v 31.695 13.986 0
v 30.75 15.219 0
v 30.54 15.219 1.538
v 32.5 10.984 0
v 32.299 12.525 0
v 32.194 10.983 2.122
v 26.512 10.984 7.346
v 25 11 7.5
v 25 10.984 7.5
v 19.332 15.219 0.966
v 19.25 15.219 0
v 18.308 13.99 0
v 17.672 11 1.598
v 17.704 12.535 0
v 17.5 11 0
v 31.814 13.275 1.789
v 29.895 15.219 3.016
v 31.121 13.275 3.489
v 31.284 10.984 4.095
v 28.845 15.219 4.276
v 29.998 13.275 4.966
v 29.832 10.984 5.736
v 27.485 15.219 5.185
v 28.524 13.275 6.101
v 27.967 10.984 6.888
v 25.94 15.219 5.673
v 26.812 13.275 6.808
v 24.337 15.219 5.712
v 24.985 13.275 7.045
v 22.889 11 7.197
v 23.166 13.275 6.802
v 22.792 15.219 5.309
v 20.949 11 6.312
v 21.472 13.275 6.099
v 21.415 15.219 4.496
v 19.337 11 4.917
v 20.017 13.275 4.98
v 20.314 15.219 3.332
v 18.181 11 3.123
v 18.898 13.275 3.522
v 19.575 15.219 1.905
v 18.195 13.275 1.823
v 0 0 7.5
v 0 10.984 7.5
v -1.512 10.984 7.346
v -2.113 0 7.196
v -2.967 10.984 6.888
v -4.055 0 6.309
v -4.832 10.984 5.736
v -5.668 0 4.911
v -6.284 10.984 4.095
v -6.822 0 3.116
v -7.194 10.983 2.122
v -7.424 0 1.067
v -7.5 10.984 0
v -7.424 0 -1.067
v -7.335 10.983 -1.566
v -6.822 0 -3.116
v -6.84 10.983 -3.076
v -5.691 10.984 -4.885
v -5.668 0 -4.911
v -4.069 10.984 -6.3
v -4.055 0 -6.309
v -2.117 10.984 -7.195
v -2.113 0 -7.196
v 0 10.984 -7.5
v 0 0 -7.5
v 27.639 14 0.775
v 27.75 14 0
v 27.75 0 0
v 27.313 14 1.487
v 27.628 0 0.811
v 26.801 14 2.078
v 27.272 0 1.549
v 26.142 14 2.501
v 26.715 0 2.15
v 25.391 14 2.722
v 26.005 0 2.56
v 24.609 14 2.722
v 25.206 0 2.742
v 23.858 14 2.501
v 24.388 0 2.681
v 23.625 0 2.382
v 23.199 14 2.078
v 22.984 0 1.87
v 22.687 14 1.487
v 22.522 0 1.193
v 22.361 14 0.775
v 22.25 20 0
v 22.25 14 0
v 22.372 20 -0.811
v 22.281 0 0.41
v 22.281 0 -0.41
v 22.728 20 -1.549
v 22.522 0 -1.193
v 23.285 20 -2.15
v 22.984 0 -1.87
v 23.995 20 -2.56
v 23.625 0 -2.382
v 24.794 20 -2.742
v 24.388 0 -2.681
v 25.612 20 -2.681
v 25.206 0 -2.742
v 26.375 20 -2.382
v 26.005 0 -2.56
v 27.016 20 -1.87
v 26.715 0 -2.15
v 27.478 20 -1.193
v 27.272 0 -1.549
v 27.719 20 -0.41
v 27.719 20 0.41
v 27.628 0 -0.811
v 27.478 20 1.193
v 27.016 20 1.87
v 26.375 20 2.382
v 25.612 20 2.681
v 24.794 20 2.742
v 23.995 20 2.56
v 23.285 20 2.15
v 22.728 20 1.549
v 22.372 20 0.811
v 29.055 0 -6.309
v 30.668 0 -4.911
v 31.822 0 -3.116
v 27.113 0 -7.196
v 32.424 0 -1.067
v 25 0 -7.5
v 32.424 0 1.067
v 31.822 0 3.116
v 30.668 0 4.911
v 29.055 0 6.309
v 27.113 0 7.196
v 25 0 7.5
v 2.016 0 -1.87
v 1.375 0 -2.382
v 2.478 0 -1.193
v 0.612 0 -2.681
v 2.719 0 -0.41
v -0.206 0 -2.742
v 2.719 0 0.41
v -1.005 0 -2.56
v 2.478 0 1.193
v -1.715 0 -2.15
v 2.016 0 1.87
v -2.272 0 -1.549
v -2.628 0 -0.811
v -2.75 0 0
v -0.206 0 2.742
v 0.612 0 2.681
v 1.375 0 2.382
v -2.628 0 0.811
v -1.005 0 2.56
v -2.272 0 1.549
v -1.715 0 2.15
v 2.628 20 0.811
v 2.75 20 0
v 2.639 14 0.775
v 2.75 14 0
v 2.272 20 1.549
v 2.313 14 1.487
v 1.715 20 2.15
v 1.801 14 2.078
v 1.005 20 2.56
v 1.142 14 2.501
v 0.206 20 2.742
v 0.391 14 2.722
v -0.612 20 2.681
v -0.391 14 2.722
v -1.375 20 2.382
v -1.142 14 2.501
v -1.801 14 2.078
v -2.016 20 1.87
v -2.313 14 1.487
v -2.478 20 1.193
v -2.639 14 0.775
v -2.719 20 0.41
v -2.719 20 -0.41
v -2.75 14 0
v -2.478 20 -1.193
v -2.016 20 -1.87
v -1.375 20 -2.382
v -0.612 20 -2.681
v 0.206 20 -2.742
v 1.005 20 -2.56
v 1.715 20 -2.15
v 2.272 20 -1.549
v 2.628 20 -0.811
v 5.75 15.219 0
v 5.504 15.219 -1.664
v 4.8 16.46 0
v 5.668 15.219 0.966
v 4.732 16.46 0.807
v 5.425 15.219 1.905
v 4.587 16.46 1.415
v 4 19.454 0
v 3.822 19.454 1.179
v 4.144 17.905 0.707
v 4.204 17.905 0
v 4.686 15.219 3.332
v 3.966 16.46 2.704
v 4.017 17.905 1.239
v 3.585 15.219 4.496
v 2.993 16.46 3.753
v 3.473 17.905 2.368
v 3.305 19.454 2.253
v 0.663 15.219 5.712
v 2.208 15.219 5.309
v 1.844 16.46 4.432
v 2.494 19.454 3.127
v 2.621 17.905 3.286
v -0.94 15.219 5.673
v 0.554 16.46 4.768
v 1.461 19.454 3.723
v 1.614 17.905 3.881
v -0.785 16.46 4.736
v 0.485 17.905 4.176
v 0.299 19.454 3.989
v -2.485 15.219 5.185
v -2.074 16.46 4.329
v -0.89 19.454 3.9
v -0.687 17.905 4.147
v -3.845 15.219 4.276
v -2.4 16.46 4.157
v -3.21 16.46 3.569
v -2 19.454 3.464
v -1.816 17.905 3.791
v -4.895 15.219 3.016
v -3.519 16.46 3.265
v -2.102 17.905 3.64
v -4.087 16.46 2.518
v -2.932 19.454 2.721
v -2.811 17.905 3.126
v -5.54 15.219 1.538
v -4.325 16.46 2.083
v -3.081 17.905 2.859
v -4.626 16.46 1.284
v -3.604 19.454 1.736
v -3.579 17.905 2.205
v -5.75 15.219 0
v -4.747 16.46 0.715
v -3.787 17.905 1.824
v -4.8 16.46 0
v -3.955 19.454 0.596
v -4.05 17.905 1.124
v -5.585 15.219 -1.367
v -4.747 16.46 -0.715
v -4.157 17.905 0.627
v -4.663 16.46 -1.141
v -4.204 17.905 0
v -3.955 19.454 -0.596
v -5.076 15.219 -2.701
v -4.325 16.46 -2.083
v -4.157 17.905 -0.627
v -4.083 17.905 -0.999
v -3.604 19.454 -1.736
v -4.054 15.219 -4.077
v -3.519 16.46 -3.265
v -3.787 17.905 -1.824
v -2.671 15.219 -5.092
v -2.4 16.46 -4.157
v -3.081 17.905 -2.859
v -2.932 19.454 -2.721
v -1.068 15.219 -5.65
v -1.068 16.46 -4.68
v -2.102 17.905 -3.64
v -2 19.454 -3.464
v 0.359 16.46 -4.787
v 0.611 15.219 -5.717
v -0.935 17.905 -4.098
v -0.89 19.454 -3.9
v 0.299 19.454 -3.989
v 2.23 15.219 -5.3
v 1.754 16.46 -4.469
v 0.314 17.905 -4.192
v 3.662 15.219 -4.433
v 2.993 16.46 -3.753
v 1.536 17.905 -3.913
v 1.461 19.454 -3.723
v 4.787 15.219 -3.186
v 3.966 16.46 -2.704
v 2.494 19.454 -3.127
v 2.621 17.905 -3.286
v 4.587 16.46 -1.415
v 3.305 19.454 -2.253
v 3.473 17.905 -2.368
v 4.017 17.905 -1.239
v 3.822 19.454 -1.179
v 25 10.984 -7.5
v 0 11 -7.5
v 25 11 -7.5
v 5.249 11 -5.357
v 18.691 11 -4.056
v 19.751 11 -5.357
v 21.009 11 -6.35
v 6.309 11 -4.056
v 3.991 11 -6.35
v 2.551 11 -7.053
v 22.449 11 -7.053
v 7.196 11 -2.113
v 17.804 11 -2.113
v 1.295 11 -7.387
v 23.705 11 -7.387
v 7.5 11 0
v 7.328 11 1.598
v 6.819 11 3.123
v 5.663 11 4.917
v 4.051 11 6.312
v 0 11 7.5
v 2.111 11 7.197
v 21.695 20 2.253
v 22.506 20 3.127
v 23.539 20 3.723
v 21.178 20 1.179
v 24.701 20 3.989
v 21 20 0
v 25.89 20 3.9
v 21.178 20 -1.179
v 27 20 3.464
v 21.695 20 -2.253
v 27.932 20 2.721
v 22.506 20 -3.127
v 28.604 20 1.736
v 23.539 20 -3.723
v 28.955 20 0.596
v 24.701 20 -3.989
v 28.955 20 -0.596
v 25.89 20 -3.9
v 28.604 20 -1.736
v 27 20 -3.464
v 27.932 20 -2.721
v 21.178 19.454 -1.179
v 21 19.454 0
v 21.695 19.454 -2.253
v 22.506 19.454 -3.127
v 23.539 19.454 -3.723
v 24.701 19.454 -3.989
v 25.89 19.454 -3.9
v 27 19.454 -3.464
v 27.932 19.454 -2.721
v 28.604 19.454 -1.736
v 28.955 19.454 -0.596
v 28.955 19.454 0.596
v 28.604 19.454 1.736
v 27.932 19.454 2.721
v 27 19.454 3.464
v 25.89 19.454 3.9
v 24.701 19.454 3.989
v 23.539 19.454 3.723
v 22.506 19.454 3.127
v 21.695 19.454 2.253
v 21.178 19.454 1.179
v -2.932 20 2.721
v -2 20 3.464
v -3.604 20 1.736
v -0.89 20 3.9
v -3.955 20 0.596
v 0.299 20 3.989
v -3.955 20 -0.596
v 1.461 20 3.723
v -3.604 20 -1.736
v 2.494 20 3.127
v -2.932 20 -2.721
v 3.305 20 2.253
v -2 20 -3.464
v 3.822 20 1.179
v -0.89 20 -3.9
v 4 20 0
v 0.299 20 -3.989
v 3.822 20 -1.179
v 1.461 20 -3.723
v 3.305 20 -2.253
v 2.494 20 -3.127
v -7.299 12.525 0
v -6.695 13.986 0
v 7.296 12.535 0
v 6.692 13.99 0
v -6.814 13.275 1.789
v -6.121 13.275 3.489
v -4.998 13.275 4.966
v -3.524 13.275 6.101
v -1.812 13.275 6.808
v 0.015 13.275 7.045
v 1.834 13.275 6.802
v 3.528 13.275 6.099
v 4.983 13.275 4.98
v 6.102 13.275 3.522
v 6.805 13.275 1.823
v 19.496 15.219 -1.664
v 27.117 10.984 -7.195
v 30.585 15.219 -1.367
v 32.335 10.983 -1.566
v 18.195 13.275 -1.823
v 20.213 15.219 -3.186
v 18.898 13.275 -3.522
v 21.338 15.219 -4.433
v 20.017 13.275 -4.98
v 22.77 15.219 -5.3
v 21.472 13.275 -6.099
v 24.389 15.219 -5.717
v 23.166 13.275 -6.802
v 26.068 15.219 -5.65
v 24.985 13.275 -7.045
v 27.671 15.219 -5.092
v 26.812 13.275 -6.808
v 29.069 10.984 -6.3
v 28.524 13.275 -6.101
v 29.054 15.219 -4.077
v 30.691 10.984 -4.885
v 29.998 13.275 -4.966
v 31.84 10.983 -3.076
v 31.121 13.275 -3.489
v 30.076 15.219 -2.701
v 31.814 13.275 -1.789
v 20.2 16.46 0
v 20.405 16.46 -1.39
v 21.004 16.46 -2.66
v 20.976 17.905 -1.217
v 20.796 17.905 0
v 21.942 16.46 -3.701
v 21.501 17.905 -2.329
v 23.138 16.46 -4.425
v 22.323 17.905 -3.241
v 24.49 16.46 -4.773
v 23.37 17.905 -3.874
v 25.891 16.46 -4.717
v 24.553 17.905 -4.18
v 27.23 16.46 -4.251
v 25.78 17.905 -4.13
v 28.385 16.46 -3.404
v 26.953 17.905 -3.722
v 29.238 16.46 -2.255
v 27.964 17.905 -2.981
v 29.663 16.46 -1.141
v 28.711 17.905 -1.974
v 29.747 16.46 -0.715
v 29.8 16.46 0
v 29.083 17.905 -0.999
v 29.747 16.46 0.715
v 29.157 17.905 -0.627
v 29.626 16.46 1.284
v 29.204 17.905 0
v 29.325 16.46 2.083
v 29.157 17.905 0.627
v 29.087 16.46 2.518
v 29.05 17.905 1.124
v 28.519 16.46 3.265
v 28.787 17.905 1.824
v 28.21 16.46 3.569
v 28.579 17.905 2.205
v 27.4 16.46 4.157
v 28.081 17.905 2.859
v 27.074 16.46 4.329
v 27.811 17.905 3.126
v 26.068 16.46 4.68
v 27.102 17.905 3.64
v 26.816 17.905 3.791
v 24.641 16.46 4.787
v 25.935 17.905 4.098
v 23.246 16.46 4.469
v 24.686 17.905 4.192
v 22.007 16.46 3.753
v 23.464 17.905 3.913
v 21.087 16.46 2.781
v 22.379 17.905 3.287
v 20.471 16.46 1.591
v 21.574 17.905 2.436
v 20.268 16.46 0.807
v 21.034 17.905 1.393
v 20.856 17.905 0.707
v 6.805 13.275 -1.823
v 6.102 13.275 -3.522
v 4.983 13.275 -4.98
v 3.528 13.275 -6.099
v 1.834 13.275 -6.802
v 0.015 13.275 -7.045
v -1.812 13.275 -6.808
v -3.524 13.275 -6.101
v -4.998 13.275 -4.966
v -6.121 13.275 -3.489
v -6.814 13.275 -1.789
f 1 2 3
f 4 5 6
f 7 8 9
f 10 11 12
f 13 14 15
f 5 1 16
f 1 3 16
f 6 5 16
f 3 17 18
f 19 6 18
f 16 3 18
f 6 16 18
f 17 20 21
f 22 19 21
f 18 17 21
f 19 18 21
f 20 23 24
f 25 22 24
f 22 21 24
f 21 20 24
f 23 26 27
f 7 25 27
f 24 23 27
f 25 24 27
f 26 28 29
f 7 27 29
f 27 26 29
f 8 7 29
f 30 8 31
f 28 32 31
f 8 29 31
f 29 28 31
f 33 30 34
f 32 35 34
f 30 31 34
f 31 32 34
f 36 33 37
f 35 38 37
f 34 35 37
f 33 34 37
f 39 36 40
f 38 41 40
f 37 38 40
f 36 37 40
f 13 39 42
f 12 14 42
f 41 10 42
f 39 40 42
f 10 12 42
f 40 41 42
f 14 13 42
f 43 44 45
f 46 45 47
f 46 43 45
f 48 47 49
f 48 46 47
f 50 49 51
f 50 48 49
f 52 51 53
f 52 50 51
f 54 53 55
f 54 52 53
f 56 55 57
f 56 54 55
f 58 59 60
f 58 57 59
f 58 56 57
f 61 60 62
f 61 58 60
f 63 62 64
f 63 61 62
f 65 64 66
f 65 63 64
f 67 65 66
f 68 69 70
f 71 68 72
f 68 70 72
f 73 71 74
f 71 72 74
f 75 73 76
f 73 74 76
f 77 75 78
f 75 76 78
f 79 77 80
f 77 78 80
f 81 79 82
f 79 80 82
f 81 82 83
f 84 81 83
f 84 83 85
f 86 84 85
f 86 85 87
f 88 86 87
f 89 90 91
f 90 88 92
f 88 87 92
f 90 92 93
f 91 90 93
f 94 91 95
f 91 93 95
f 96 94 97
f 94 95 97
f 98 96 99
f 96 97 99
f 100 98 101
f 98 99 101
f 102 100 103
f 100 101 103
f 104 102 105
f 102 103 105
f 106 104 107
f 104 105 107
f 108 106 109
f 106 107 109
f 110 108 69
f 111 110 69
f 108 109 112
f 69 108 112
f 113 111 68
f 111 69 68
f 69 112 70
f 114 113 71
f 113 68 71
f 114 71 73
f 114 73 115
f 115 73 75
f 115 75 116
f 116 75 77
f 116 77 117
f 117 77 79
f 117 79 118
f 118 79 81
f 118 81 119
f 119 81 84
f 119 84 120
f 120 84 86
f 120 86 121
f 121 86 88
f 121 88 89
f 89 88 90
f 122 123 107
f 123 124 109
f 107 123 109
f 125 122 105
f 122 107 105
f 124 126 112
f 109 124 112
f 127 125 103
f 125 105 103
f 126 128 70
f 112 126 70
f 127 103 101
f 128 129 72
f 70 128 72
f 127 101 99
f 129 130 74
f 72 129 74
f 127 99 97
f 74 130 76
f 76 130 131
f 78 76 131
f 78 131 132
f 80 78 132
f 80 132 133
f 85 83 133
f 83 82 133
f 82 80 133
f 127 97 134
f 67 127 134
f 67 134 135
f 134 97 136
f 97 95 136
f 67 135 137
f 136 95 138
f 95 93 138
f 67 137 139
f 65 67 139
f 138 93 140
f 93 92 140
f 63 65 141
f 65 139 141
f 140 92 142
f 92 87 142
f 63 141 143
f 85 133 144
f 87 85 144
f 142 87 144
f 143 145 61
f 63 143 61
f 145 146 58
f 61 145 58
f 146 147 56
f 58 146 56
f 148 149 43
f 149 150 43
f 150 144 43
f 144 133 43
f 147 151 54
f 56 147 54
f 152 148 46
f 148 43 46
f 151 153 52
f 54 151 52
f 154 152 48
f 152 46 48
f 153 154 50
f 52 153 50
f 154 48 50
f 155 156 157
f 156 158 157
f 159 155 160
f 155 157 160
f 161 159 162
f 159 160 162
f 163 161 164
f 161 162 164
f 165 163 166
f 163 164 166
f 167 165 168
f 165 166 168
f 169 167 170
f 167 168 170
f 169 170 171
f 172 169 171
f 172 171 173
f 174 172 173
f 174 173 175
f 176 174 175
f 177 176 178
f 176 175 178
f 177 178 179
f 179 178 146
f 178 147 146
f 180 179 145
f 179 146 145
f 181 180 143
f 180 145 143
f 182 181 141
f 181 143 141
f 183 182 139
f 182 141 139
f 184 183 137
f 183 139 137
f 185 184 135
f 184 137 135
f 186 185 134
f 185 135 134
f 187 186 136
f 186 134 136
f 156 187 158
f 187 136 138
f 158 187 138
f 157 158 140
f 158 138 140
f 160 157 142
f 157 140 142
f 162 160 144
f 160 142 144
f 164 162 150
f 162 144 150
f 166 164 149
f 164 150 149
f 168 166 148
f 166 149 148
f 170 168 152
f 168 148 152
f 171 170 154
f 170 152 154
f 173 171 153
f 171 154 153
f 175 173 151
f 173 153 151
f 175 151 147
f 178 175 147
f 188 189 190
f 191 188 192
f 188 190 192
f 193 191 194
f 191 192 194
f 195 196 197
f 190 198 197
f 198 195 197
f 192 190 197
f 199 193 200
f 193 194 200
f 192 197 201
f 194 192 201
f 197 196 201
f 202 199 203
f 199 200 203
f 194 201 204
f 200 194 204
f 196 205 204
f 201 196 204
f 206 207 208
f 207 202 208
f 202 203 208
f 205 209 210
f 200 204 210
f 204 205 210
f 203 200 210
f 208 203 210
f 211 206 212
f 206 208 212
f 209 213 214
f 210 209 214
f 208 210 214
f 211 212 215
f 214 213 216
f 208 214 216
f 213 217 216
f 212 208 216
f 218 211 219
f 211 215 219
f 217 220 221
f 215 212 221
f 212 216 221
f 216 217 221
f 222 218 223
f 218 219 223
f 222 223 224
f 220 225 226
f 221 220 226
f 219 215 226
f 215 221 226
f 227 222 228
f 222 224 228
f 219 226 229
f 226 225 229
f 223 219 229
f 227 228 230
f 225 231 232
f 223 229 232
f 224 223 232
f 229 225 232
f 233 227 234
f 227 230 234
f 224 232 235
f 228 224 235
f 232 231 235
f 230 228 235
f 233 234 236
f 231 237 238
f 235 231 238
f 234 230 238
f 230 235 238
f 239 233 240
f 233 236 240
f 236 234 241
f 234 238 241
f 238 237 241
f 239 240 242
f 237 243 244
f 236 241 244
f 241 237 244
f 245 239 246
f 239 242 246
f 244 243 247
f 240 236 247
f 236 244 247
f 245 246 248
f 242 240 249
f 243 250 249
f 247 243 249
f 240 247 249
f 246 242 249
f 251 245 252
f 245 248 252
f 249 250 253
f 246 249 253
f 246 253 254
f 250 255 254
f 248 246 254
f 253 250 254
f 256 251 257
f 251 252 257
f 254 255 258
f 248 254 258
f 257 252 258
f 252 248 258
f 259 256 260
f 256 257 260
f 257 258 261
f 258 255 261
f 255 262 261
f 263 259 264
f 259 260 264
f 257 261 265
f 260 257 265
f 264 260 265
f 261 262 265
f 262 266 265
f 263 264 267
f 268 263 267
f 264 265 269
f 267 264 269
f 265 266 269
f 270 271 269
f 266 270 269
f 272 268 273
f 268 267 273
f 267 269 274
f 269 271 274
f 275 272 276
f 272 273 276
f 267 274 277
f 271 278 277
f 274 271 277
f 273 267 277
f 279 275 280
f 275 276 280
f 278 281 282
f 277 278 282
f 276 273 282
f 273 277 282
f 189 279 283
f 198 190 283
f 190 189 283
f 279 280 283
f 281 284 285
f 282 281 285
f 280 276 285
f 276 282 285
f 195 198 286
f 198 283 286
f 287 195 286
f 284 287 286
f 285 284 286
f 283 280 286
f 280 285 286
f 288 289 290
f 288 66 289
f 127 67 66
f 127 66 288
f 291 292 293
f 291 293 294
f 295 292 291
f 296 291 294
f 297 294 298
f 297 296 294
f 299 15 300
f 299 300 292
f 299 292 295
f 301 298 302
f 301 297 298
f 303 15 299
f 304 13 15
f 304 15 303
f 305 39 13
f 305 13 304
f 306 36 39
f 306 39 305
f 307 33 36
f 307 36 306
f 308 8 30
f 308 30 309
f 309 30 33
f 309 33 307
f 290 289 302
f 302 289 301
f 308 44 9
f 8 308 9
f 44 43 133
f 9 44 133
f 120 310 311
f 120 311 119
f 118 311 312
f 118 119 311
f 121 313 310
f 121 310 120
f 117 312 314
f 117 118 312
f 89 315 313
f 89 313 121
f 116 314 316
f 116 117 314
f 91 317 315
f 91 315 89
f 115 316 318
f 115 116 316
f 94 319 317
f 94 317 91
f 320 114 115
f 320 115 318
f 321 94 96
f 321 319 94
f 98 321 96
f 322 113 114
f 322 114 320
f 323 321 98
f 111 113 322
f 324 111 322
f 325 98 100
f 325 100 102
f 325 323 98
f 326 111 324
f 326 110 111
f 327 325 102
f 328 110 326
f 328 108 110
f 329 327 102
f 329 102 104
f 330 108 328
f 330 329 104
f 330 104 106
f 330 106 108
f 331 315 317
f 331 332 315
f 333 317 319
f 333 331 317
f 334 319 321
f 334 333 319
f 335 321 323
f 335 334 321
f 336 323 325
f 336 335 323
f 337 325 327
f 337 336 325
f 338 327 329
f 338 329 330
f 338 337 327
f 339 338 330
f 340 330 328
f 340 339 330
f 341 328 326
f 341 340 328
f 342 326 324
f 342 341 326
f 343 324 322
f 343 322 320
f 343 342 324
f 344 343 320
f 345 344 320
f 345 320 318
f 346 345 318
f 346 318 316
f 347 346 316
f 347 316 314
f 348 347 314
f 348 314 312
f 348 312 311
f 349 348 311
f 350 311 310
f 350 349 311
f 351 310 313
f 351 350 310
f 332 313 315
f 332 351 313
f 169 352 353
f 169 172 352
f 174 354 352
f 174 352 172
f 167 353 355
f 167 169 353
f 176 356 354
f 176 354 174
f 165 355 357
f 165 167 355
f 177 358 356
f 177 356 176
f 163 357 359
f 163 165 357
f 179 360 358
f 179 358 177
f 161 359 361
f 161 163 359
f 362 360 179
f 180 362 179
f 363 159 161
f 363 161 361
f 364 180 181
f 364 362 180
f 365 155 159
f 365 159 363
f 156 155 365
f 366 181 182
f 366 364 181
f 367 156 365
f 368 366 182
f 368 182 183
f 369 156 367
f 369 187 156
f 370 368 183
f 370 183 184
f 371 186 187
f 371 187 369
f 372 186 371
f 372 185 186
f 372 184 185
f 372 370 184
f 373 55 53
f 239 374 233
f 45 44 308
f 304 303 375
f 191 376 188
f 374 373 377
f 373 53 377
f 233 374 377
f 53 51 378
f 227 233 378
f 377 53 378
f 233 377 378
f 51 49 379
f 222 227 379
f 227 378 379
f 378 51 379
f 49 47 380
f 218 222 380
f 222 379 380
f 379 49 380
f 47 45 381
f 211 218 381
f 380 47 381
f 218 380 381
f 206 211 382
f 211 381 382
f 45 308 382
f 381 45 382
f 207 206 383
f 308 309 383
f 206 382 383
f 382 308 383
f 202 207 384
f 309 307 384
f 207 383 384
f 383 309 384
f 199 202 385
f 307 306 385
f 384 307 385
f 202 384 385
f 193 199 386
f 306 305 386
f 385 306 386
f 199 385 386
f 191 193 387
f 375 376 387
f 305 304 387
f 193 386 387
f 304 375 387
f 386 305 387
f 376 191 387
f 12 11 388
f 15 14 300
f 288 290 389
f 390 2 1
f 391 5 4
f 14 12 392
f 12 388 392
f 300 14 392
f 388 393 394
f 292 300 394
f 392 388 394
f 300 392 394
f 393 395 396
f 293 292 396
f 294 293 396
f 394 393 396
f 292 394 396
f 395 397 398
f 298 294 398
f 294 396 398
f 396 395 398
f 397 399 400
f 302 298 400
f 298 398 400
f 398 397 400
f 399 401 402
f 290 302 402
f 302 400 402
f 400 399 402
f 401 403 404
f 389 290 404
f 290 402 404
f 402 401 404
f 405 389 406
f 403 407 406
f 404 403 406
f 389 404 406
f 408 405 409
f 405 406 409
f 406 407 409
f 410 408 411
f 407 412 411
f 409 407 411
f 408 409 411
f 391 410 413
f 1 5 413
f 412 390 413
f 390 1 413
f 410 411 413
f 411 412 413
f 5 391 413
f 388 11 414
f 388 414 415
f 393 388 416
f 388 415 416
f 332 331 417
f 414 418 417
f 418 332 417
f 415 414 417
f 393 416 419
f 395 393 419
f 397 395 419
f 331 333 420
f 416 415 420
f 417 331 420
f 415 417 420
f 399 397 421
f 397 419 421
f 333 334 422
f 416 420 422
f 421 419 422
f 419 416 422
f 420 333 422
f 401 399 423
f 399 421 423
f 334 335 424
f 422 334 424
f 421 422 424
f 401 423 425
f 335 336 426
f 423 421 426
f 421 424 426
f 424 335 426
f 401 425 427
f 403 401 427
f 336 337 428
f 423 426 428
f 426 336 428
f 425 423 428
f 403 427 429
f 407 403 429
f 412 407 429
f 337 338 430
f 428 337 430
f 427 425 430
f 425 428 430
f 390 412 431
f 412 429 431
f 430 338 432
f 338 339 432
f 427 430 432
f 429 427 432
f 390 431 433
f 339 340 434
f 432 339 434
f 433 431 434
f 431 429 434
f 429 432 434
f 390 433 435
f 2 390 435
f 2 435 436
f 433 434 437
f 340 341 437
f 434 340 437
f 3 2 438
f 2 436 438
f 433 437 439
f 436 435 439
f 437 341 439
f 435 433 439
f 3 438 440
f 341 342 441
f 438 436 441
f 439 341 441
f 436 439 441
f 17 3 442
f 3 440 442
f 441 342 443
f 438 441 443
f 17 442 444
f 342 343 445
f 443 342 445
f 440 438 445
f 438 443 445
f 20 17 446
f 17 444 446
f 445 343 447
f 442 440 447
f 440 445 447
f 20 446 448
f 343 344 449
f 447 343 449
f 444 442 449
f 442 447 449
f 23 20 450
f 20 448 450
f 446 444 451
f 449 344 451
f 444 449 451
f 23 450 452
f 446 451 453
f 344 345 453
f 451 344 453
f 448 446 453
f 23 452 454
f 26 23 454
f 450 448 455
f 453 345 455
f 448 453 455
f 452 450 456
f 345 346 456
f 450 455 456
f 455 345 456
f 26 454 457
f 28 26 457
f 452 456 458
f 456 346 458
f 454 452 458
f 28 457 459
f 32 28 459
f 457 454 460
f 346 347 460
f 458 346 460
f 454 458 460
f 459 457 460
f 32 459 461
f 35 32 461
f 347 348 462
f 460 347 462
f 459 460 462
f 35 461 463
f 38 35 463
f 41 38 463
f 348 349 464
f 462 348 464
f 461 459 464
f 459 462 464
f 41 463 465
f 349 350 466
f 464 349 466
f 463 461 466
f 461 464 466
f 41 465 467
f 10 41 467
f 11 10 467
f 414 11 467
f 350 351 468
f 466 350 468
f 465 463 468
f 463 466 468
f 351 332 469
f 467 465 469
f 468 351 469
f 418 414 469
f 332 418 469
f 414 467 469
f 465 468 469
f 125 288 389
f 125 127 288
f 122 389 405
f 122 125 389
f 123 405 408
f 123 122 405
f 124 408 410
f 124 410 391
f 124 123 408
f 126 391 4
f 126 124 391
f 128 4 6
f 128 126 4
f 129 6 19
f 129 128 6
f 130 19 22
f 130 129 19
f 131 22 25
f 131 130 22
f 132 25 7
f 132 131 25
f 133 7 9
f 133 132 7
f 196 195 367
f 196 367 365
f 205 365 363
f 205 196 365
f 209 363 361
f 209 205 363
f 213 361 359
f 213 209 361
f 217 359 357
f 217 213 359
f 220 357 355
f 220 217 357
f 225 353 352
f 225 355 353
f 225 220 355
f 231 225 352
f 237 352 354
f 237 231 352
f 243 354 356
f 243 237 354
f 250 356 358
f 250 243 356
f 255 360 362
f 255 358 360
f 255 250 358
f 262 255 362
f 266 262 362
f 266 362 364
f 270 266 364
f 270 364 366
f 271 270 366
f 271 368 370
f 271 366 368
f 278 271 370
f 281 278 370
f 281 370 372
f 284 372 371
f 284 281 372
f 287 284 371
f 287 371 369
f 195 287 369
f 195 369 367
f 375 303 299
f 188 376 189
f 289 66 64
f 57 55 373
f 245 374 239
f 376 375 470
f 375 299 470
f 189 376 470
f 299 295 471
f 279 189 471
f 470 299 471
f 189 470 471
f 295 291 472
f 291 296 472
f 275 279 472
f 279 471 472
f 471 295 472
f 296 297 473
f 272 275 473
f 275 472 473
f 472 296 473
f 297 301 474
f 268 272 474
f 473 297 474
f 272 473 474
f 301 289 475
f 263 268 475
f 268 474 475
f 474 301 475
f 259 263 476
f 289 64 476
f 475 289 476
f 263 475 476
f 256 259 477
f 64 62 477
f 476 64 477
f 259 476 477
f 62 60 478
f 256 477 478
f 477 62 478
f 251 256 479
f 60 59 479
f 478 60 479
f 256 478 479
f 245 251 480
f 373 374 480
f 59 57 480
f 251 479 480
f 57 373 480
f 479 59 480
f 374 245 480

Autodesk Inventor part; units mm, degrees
ref_plane "XZ Plane" through (0, 0, 0) normal (0, 1, 0) x (-1, 0, 0)
ref_plane "XY Plane" through (0, 0, 0) normal (0, 0, 1) x (1, 0, 0)
sketch "Sketch1" plane through (0, 0, 0) normal (0, 1, 0) x (-1, 0, 0)
  circle A0 centre (0, 0) radius 7.5
  circle A1 centre (0, 0) radius 2.75
  dimension "d0" = 15
  dimension "d1" = 5.5
extrude "Extrusion1" add sketch "Sketch1" along normal blind 14
sketch "Sketch2" plane through (0, 14, 0) normal (0, 1, 0) x (1, 0, 0)
  circle A0 centre (0, 0) radius 2.75 projected
  circle A1 centre (0, 0) radius 2.75
  circle A2 centre (0, 0) radius 4
  dimension "d4" = 5.5
  dimension "d5" = 8
extrude "Extrusion2" add sketch "Sketch2" along normal blind 6
fillet "Fillet1" radius 6 1 edges at (-4, 14, 0)
fillet "Fillet2" radius 6 2 edges at (0, 14, -7.5) (0, 14, 7.5)
ref_plane "Work Plane1" through (12.5, 0, 0) normal (1, 0, 0) x (0, 1, 0)
mirror "Mirror1" about plane through (12.5, 0, 0) normal (1, 0, 0) of "Extrusion1", "Extrusion2", "Fillet1", "Fillet2"
sketch "Sketch3" plane through (0, 0, 0) normal (0, 1, 0) x (-1, 0, 0)
  circle A0 centre (-25, 0) radius 2.75 projected
  line L0 (-25, 0) -> (-25, 2.75)
  line L1 (-25, 0) -> (-25, -2.75)
  line L2 (0, 0) -> (0, -2.75)
  circle A1 centre (0, 0) radius 2.75 projected
  line L3 (0, 0) -> (0, 2.75)
  line L4 (-25, 2.75) -> (0, 2.75)
  line L5 (0, 2.75) -> (0, 7.5)
  line L6 (0, 7.5) -> (-25, 7.5)
  line L7 (-25, 7.5) -> (-25, 2.75)
  line L8 (-25, -2.75) -> (0, -2.75)
  line L9 (0, -2.75) -> (0, -7.5)
  line L10 (0, -7.5) -> (-25, -7.5)
  line L11 (-25, -7.5) -> (-25, -2.75)
  dimension "d11" = 25
  dimension "d12" = 4.75
  dimension "d13" = 25
  dimension "d14" = 4.75
extrude "Extrusion3" add sketch "Sketch3" along normal blind 11 contours A0 L4 A1 L8 | L7 L6 L5 L4 | L8 L9 L10 L11
properties part number "4mm_Roller_Spacer_simple"
